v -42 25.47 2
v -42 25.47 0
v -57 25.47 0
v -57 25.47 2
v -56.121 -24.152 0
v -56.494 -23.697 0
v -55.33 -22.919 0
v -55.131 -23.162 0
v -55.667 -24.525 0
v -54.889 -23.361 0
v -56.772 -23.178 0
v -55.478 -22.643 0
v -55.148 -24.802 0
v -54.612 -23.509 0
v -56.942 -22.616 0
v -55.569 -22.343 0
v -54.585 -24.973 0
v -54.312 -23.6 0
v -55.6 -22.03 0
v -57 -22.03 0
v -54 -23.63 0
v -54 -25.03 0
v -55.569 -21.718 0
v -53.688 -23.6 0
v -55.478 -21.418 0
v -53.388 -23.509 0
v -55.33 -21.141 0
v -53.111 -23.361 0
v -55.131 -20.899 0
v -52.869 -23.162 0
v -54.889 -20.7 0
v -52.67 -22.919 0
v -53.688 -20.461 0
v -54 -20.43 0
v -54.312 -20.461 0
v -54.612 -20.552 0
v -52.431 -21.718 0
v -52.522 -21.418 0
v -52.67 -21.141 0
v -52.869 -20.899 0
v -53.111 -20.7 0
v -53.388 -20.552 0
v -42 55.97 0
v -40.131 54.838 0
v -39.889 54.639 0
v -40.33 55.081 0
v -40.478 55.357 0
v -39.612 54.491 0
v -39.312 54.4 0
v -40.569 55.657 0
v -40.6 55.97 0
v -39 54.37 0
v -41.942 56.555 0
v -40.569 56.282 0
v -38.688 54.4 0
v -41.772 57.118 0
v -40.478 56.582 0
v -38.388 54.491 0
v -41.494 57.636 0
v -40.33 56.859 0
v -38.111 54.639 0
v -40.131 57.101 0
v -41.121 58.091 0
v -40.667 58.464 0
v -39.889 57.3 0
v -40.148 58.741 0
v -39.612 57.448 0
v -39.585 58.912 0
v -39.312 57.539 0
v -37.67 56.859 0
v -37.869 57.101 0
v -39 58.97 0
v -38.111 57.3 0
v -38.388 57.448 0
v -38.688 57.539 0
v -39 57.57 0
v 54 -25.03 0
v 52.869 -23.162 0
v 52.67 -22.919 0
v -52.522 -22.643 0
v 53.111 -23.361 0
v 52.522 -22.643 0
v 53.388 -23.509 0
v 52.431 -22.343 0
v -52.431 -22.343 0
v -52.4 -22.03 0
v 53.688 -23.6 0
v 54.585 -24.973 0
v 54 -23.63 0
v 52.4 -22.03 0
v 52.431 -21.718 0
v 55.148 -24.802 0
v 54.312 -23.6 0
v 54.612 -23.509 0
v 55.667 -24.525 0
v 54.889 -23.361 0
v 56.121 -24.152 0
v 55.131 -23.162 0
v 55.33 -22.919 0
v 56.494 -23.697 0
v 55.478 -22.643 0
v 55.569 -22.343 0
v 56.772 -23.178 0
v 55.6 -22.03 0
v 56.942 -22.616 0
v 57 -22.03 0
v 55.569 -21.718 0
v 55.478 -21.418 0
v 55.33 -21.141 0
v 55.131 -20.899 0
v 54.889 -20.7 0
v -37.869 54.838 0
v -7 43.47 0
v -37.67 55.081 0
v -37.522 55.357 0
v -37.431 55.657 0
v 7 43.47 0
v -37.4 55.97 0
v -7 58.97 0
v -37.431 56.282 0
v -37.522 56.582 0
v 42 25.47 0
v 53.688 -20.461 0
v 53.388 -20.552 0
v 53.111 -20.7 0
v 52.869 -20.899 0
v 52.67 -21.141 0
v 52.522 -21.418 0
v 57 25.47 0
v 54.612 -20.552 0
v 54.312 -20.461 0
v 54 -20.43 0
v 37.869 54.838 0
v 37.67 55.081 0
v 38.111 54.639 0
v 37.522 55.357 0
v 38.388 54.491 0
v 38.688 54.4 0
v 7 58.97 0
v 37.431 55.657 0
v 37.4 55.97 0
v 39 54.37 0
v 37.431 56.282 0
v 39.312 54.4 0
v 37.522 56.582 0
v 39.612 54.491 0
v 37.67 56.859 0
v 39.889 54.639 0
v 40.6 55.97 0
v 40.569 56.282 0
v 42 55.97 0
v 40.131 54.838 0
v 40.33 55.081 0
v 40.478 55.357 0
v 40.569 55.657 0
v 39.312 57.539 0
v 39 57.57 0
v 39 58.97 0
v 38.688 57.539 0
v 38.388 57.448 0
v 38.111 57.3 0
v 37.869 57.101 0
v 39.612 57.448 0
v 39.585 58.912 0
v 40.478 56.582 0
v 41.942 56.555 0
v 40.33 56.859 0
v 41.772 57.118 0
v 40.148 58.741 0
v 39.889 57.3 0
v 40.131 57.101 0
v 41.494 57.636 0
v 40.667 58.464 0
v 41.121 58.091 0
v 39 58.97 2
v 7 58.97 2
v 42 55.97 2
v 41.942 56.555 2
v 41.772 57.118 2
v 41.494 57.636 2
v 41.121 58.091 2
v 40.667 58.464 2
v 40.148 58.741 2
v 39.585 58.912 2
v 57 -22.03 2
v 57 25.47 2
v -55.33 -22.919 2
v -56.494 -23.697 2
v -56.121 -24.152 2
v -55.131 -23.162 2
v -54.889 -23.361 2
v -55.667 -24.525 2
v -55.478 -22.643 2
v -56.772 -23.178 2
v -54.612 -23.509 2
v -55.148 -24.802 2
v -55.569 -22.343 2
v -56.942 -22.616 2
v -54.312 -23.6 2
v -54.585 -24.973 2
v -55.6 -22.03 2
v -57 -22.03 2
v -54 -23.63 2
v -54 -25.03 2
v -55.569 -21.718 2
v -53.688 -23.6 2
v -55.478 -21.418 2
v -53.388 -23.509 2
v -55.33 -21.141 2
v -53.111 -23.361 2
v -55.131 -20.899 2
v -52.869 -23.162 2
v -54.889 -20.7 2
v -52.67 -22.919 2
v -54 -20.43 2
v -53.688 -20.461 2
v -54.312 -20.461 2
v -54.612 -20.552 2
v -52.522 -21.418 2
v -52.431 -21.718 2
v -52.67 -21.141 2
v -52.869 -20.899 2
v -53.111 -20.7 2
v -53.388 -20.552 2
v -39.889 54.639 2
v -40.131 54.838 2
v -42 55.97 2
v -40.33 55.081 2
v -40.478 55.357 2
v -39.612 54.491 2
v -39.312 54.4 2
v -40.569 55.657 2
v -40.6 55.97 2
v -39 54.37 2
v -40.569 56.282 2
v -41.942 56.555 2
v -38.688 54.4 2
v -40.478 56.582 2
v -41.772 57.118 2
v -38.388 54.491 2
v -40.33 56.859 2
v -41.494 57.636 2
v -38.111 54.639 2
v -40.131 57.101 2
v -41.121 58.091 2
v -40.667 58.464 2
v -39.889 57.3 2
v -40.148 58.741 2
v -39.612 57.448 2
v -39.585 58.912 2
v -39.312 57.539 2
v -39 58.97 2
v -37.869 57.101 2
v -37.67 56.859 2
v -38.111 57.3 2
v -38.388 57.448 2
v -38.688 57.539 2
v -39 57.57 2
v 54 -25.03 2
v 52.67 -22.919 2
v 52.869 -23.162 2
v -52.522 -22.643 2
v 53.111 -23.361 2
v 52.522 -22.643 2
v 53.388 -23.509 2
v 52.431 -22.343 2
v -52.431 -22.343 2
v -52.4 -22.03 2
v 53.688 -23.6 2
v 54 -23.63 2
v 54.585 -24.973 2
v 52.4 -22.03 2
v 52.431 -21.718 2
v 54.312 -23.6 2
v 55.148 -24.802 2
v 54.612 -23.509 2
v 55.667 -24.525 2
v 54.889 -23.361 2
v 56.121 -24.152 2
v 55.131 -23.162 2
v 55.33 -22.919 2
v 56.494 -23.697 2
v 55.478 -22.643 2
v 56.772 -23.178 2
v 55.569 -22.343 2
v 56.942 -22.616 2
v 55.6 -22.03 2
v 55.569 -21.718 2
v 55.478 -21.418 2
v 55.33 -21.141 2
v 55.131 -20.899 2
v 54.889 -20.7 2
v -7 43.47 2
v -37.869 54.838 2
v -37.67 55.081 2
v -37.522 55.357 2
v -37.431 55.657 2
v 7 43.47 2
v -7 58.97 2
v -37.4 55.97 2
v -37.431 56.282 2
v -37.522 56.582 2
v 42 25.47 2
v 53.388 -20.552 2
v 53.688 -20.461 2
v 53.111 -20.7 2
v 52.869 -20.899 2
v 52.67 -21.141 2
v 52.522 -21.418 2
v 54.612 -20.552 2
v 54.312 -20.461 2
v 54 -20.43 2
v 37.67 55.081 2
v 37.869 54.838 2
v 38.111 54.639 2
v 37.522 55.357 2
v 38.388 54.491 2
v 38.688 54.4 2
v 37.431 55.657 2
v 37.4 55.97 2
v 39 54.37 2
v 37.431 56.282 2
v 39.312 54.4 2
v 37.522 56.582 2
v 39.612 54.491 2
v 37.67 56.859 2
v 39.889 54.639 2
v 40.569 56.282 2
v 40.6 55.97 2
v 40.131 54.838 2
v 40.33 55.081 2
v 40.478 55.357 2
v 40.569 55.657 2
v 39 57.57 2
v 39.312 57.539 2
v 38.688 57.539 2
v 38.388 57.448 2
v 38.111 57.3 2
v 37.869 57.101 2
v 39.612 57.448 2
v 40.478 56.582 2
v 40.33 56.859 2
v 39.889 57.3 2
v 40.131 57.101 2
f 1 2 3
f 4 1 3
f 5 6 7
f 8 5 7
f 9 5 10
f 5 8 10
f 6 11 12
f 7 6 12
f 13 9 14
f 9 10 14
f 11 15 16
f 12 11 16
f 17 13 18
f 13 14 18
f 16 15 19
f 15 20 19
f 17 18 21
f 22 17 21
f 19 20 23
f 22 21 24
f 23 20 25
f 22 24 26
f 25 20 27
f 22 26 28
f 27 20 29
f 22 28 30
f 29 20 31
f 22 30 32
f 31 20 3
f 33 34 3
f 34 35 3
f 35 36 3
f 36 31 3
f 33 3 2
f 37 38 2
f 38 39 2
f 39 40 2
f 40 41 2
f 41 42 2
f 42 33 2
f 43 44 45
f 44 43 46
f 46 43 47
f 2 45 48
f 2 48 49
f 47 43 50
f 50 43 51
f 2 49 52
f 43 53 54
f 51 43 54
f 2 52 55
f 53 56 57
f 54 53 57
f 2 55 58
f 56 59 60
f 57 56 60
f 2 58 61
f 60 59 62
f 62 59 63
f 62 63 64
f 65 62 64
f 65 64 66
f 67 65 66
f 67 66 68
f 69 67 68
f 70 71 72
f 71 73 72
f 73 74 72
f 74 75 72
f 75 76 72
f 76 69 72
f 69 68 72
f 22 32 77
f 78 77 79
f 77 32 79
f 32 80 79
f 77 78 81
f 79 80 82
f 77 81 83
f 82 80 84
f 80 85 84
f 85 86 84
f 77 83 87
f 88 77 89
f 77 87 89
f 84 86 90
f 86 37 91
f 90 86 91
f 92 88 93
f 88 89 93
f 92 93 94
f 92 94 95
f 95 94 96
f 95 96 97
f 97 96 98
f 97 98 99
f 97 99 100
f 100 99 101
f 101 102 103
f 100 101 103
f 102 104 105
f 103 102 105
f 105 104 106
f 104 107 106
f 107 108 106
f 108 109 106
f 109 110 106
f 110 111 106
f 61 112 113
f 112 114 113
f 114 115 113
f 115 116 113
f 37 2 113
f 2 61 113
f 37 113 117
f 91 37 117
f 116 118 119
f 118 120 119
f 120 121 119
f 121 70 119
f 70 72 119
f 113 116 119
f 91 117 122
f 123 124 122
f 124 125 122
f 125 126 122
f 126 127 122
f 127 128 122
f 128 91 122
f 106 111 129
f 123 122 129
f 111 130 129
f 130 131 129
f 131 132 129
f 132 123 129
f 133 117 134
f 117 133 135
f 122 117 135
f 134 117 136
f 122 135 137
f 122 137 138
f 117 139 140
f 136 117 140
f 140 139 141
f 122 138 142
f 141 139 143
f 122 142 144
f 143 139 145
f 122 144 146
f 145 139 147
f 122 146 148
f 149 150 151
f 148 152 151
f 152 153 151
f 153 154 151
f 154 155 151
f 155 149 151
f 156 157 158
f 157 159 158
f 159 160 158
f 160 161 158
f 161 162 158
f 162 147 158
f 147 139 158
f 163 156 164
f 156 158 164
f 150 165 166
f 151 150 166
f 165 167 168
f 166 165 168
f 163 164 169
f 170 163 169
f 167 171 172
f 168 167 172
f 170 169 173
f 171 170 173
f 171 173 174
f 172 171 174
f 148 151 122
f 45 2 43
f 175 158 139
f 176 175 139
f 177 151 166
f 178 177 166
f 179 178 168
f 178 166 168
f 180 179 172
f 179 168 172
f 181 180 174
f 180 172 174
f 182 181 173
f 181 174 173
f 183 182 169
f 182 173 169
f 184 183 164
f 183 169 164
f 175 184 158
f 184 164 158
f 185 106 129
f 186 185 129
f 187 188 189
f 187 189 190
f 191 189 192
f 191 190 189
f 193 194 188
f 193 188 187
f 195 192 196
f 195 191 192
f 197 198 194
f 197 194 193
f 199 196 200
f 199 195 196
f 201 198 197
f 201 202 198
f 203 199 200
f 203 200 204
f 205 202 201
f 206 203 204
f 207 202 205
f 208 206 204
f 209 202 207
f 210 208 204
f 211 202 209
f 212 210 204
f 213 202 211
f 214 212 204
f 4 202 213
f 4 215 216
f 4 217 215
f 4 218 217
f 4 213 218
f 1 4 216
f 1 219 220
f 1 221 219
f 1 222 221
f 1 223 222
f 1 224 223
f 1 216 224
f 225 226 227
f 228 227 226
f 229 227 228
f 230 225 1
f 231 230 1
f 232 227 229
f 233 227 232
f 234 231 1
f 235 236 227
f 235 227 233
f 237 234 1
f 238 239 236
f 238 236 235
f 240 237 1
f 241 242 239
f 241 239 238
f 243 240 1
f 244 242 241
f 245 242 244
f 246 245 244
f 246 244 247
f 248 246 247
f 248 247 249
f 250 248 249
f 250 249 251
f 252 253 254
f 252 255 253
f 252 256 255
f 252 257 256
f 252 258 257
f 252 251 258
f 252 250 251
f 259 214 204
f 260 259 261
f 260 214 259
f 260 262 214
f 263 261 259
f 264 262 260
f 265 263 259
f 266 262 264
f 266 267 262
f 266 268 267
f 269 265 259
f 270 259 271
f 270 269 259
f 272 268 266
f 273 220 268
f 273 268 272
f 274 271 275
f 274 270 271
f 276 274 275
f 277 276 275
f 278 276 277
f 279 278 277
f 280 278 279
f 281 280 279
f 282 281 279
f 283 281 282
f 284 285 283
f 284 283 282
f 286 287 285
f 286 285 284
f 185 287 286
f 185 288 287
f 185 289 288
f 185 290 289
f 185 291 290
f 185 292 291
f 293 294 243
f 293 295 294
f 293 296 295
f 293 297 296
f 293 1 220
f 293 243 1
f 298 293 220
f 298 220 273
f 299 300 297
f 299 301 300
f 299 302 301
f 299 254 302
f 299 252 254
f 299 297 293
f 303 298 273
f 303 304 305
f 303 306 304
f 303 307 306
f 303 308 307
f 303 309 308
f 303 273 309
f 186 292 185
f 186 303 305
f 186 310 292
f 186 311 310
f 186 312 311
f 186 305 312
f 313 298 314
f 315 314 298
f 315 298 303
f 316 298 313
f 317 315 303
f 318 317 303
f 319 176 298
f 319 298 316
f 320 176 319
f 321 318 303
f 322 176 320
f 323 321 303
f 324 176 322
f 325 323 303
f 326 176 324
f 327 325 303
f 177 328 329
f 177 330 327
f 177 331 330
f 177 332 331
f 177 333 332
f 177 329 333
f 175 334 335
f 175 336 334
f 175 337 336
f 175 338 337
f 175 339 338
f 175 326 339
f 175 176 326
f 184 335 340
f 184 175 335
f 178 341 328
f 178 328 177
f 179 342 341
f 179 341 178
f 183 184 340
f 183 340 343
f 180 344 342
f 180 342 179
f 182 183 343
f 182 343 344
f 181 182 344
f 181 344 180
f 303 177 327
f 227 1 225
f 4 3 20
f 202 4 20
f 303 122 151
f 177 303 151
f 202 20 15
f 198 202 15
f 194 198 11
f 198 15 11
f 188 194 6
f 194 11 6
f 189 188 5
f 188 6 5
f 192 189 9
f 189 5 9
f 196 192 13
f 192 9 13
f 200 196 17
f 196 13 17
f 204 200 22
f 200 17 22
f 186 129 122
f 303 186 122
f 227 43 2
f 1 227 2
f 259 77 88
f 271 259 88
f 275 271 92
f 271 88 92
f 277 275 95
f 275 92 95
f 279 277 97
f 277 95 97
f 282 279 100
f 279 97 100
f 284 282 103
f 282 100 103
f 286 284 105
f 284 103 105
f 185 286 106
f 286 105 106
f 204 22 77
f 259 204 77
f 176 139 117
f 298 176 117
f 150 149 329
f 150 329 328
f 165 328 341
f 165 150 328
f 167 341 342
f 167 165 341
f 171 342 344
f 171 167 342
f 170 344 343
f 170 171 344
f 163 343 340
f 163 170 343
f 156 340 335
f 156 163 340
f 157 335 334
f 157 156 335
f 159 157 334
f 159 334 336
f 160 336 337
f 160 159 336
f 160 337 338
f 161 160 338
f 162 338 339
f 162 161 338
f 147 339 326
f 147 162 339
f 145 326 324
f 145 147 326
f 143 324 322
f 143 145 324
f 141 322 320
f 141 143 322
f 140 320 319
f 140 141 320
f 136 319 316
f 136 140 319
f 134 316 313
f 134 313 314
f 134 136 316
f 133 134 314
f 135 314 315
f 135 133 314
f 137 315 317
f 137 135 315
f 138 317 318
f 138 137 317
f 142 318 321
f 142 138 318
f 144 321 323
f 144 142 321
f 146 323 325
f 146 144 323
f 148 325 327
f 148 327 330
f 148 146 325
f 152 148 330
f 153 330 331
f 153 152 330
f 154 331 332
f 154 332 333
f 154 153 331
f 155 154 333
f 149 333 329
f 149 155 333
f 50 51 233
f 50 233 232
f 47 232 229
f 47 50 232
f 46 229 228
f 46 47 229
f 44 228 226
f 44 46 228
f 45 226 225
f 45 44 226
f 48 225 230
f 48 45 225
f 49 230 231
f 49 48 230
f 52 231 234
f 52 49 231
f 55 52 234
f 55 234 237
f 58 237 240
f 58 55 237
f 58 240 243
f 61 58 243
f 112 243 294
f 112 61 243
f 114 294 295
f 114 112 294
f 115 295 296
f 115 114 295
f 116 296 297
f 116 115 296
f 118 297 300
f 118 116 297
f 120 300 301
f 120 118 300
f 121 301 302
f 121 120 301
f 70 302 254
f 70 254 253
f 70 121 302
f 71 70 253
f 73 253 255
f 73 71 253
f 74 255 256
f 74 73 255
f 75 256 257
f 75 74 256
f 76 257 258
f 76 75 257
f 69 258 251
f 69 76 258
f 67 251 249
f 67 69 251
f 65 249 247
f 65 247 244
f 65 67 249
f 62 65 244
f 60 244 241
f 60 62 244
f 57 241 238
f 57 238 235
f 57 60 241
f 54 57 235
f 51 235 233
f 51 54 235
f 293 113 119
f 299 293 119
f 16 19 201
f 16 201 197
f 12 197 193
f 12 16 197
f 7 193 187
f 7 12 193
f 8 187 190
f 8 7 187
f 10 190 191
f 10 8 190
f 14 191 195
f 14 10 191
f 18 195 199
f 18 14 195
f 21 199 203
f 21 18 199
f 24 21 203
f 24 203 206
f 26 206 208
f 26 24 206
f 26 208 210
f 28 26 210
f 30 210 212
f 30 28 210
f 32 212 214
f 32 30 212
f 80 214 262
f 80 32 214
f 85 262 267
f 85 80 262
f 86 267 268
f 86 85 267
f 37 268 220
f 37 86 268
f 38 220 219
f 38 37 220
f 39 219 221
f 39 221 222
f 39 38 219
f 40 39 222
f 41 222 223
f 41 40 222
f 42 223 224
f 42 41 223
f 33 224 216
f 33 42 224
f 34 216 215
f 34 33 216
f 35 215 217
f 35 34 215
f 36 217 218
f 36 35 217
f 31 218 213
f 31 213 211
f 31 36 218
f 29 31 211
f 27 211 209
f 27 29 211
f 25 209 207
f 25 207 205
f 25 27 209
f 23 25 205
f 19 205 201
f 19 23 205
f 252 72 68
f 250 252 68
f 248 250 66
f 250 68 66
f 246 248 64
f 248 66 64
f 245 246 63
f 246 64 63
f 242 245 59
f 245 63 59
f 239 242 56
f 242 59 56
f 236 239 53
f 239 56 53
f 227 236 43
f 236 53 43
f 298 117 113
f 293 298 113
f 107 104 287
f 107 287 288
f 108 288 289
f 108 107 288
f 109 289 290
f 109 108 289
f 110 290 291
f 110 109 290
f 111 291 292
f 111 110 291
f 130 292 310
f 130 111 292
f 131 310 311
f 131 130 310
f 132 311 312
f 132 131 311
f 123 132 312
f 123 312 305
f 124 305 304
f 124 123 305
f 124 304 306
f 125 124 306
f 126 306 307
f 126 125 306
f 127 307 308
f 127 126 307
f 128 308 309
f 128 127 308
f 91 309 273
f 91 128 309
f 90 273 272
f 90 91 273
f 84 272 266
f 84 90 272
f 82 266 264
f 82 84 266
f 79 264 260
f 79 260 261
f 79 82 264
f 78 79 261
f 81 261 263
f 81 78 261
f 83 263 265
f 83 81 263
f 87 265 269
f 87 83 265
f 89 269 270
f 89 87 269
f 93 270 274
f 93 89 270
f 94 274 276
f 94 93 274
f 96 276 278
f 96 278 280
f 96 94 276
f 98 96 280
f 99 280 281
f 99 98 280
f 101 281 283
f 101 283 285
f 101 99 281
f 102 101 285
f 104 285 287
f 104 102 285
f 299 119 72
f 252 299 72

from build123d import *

# Parameters (mm, degrees)
SKETCH1_R           = 1.6
BOSS_EXTRUDE1_DEPTH = 2


with BuildPart() as part:
    # Sketch1 → Boss-Extrude1 (new body)
    with BuildSketch(Plane.XY):
        with BuildLine():
            Line((-42, 25.469603275), (-57, 25.469603275))
            Line((-57, 25.469603275), (-57, -22.030396725))
            ThreePointArc((-57, -22.030396725), (-56.121320344, -24.151717068), (-54, -25.030396725))
            Line((-54, -25.030396725), (54, -25.030396725))
            ThreePointArc((54, -25.030396725), (56.121320344, -24.151717068), (57, -22.030396725))
            Line((57, -22.030396725), (57, 25.469603275))
            Line((57, 25.469603275), (42, 25.469603275))
            Line((42, 25.469603275), (42, 55.969603275))
            ThreePointArc((42, 55.969603275), (41.121320344, 58.090923619), (39, 58.969603275))
            Line((39, 58.969603275), (7, 58.969603275))
            Line((7, 58.969603275), (7, 43.469603275))
            Line((7, 43.469603275), (-7, 43.469603275))
            Line((-7, 43.469603275), (-7, 58.969603275))
            Line((-7, 58.969603275), (-39, 58.969603275))
            ThreePointArc((-39, 58.969603275), (-41.121320344, 58.090923619), (-42, 55.969603275))
            Line((-42, 55.969603275), (-42, 25.469603275))
        make_face()
        with Locations((54, -22.030396725)):
            Circle(SKETCH1_R, mode=Mode.SUBTRACT)
        with Locations(Location((-54, -22.030396725, 0), (0, 0, 180))):
            Circle(SKETCH1_R, mode=Mode.SUBTRACT)
        with Locations((39, 55.969603275)):
            Circle(SKETCH1_R, mode=Mode.SUBTRACT)
        with Locations(Location((-39, 55.969603275, 0), (0, 0, 180))):
            Circle(SKETCH1_R, mode=Mode.SUBTRACT)
    extrude(amount=BOSS_EXTRUDE1_DEPTH)


solid = part.part
